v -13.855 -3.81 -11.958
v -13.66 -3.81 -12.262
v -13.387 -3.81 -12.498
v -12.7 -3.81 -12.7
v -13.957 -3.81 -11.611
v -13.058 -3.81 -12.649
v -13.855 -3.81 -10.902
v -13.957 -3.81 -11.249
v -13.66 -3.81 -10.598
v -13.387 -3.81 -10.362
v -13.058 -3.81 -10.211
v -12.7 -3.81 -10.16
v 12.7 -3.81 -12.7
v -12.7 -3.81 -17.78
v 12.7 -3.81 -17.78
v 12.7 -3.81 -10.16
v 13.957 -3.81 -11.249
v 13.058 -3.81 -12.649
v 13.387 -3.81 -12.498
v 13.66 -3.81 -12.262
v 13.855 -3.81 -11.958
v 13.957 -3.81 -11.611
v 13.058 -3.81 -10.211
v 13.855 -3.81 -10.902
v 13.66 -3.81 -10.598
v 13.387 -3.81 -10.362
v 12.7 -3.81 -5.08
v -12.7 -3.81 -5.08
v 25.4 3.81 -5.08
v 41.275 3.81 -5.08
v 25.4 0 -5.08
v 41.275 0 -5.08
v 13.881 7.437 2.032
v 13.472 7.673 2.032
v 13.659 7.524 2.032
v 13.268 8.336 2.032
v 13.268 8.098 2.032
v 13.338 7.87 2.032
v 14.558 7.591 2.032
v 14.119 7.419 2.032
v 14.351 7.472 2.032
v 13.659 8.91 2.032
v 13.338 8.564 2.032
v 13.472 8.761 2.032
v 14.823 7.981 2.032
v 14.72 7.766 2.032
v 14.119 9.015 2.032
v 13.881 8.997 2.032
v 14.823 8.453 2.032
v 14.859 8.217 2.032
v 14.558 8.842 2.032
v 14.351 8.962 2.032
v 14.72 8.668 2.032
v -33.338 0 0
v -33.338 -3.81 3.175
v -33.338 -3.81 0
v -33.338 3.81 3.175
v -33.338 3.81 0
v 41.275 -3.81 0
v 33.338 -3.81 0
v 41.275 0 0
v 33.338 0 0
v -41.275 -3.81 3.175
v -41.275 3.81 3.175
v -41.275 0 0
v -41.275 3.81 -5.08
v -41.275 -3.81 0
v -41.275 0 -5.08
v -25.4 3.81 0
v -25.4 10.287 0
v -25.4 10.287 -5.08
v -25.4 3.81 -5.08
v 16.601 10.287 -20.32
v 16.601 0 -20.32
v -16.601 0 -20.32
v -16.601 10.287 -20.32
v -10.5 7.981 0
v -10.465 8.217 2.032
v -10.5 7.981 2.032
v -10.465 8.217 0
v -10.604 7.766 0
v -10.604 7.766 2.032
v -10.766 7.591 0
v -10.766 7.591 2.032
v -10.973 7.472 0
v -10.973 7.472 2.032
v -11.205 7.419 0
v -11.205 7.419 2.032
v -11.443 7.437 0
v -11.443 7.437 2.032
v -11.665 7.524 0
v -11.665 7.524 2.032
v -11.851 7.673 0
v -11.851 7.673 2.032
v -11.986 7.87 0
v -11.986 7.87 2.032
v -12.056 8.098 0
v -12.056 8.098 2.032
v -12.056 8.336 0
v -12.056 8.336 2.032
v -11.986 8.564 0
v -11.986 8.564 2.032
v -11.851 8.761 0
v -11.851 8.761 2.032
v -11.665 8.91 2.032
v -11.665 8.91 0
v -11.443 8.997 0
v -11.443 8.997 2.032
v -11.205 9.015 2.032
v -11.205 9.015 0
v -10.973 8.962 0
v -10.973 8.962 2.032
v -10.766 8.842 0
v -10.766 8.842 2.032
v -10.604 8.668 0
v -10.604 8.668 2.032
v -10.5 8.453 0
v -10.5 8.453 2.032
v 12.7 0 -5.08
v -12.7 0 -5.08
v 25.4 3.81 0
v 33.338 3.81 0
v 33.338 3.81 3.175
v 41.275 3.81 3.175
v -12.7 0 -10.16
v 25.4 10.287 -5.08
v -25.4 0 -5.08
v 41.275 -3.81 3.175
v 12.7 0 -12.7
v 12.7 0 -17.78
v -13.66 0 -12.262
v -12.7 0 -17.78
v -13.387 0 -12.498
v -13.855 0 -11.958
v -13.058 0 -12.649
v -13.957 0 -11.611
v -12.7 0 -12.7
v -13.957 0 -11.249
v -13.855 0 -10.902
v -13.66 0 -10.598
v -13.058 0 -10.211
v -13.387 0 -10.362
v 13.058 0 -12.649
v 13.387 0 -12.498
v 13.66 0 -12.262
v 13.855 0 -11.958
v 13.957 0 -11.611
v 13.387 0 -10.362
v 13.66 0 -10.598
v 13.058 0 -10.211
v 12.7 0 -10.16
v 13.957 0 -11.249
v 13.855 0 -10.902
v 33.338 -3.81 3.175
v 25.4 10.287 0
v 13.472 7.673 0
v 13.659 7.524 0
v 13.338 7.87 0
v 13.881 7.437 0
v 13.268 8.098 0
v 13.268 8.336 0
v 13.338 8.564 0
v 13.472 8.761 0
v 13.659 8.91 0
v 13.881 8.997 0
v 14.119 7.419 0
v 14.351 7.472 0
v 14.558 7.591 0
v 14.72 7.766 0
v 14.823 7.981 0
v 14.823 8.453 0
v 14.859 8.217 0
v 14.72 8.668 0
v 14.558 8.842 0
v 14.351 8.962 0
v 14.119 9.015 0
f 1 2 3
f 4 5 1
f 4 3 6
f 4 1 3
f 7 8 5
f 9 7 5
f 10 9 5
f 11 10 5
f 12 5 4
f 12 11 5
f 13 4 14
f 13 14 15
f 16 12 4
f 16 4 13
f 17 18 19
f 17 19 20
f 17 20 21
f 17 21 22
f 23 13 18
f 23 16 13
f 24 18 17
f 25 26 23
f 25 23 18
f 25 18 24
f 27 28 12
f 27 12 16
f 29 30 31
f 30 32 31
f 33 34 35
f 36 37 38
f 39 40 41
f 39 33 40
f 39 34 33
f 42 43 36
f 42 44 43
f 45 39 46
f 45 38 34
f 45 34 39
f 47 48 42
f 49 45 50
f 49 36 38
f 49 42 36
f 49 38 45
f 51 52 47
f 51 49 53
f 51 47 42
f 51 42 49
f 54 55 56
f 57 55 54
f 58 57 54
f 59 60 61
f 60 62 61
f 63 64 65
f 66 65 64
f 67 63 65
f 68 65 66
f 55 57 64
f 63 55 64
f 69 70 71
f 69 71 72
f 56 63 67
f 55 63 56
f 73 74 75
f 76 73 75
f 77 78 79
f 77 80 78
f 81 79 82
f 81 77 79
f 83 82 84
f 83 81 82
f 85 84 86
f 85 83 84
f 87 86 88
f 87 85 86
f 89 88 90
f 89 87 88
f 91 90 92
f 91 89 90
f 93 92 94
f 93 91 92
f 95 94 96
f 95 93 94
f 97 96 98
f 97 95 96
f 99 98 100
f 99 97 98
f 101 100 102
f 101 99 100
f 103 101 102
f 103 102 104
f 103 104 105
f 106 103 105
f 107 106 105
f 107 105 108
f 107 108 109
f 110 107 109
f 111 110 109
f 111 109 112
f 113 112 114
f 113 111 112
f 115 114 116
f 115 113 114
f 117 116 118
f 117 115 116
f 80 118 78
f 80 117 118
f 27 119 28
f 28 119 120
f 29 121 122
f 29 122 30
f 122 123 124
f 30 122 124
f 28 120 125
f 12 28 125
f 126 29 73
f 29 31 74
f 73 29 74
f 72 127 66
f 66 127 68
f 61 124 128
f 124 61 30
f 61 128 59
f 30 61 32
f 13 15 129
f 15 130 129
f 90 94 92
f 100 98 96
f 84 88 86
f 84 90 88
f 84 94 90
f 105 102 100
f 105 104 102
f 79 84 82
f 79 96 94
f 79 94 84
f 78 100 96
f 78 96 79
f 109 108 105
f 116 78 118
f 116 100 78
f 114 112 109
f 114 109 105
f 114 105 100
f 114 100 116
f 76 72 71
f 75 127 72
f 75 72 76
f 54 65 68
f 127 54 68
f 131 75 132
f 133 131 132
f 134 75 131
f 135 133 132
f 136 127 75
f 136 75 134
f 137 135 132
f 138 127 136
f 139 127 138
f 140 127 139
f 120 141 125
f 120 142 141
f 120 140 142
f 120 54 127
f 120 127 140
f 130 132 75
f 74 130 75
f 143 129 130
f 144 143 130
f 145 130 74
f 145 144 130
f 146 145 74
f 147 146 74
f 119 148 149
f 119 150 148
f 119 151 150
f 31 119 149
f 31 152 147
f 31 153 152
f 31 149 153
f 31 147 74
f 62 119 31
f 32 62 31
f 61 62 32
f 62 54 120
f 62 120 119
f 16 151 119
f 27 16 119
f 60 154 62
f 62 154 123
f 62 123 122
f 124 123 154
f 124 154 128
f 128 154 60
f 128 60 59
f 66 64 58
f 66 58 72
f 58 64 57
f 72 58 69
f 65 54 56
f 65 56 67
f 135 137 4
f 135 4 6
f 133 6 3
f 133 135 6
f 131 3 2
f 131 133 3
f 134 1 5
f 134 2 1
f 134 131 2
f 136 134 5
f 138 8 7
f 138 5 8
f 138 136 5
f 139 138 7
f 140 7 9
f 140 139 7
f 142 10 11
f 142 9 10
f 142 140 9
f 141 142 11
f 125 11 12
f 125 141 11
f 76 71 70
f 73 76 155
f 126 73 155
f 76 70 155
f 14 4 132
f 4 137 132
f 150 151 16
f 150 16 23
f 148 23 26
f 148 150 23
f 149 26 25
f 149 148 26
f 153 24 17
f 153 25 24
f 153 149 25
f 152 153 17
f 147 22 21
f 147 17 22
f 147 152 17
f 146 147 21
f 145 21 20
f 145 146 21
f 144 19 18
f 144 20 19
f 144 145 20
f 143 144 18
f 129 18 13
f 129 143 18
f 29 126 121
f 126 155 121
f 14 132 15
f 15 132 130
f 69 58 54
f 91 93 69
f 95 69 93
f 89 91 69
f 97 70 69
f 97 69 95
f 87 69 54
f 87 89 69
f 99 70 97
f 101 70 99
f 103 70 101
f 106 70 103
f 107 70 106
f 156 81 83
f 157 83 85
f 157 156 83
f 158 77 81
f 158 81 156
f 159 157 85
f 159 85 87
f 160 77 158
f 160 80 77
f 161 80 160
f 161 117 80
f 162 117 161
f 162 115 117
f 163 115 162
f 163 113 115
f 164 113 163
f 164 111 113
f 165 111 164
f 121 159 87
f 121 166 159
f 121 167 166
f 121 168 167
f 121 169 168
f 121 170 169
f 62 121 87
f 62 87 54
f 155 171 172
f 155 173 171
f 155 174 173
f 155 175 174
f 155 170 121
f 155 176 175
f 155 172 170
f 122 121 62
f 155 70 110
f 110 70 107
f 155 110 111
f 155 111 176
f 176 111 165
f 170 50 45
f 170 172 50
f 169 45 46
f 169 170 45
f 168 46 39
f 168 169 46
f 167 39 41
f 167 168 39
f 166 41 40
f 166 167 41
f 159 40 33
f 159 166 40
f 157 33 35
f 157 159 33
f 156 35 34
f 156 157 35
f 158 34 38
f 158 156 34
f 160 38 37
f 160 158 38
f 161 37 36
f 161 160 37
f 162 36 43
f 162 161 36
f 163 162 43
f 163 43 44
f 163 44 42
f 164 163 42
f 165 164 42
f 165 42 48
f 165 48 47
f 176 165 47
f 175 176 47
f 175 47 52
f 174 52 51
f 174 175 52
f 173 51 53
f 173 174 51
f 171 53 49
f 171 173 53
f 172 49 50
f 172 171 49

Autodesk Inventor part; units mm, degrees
ref_plane "YZ Plane" through (0, 0, 0) normal (1, 0, 0) x (0, 1, 0)
ref_plane "XZ Plane" through (0, 0, 0) normal (0, 1, 0) x (-1, 0, 0)
ref_plane "XY Plane" through (0, 0, 0) normal (0, 0, 1) x (1, 0, 0)
sketch "Sketch1" plane through (0, 0, 0) normal (0, 0, 1) x (1, 0, 0)
  line L0 (0, 12.3444) -> (0, -2.0574) projected
  line L1 (-35.56, 0) -> (35.56, 0) projected
  line L2 (-35.56, 0) -> (35.56, 0) projected
  line L3 (0, -2.0574) -> (0, 12.3444) projected
  line L4 (-12.319, 8.2169) -> (15.113, 8.2169)
  line L5 (-10.2108, 8.2169) -> (13.0048, 8.2169)
  circle A0 centre (-11.2649, 8.2169) radius 1.0541
  circle A1 centre (14.0589, 8.2169) radius 1.0541
  line L6 (-25.4, 10.287) -> (-25.4, 0)
  line L7 (-25.4, 0) -> (25.4, 0)
  line L8 (-25.4, 10.287) -> (25.4, 10.287)
  line L9 (25.4, 10.287) -> (25.4, 0)
  line L10 (25.4, 10.287) -> (14.0589, 10.287)
  line L11 (14.0589, 10.287) -> (14.0589, 7.1628)
  line L12 (14.0589, 9.271) -> (14.0589, 10.287)
  line L13 (14.0589, 8.2169) -> (15.113, 8.2169)
  circle A2 centre (-11.2649, 8.2169) radius 0.8001
  circle A3 centre (14.0589, 8.2169) radius 0.8001
  point P0 (0, 0)
  dimension "d0" = 27.432
  dimension "d1" = 23.2156
  dimension "d2" = 2.1082
  dimension "d3" = 10.287
  dimension "d4" = 50.8
  dimension "d5" = 11.3411
  dimension "d6" = 1.016
  dimension "d7" = 11.3411
  dimension "d8" = 0.254
  dimension "d9" = 0.254
extrude "Extrusion1" add sketch "Sketch1" against normal blind 5.08 contours L8 L11 A1 L4 L0 | L0 L1 L6 L8 | L4 A1 L11 L8 L9 L1 L0
extrude "Extrusion2" add sketch "Sketch1" against normal blind 5.08 contours A0 L4 A2 | L4 A2 A0 | A1 L11 A3 L4 | L4 A3 L11 A1 | A1 L4 A3 L11 | A2 L4 | L4 A2 | A3 L11 L4 | L4 L11 A3 | L11 A3 L4 A1 | A3 L4 L11 | L4 A3 L11
extrude "Extrusion3" add sketch "Sketch1" along normal blind 2.032 contours A2 L4 | L4 A2 | A3 L11 L4 | L4 L11 A3 | A3 L4 L11 | L4 A3 L11
sketch "Sketch2" plane through (-25.4, 0, 0) normal (0, -1, 0) x (1, 0, 0)
  line L0 (50.8, 0) -> (50.8, -5.08) projected
  line L1 (0, 0) -> (50.8, 0) projected
  line L2 (0, 0) -> (0, -5.08) projected
  line L3 (38.1, -5.08) -> (12.7, -5.08)
  line L4 (12.7, -17.78) -> (38.1, -17.78)
  arc A0 (38.1, -12.7) -> (38.1, -10.16) centre (38.1, -11.43) ccw
  arc A1 (12.7, -10.16) -> (12.7, -12.7) centre (12.7, -11.43) ccw
  line L5 (38.1, -17.78) -> (38.1, -12.7)
  line L6 (38.1, -10.16) -> (38.1, -5.08)
  line L7 (12.7, -5.08) -> (12.7, -10.16)
  line L8 (12.7, -12.7) -> (12.7, -17.78)
  line L9 (50.8, 0) -> (0, 0)
  line L10 (25.4, 0) -> (25.4, -33.3128)
  line L11 (25.4, -5.08) -> (25.4, -17.78)
  line L12 (50.8, -5.08) -> (0, -5.08) projected
  line L13 (50.8, -5.08) -> (0, -5.08)
  line L14 (50.8, -5.08) -> (42.0012, -20.32)
  line L15 (50.8, -5.08) -> (70.0547, -5.08) construction
  line L16 (0, -5.08) -> (8.7988, -20.32)
  line L17 (0, -5.08) -> (24.702, -5.08) construction
  line L18 (42.0012, -20.32) -> (8.7988, -20.32)
  dimension "d16" = 25.4
  dimension "d17" = 12.7
  dimension "d18" = 2.54
  dimension "d19" = 2.54
  dimension "d20" = 5.08
  dimension "d21" = 5.08
  dimension "d23" = 6.35
  dimension "d24" = 6.35
  dimension "d26" = 120
  dimension "d27" = 60
  dimension "d29" = 12.7
  dimension "d30" = 33.2024
  dimension "d31" = 19.2547
  dimension "d32" = 28.2328
  dimension "d33" = 26.098
extrude "Extrusion4" add sketch "Sketch2" against normal blind 10.287 contours L14 L18 L10 L4 L5 A0 L6 L12 | L6 A0 L5 L4 L10 L3 | L10 L4 L8 A1 L7 L3 | L18 L16 L12 L7 A1 L8 L4 L10
extrude "Extrusion5" add sketch "Sketch2" along normal blind 3.81 contours L6 A0 L5 L4 L10 L3 | L10 L4 L8 A1 L7 L3
sketch "Sketch4" plane through (-25.4, 0, 0) normal (0, -1, 0) x (1, 0, 0)
  line L0 (38.1, -5.08) -> (12.7, -5.08)
  line L1 (0, 0) -> (50.8, 0)
  line L2 (0, 0) -> (0, -5.08)
  line L3 (50.8, 0) -> (50.8, -5.08)
  line L4 (-15.875, -5.08) -> (66.675, -5.08)
  line L5 (25.4, 0) -> (25.4, -41.8957)
  line L6 (-15.875, 0) -> (-15.875, -5.08)
  line L7 (0, 0) -> (0, -5.08)
  line L8 (0, 0) -> (-15.875, 0)
  line L9 (0, 0) -> (0, -5.08)
  line L10 (50.8, 0) -> (0, 0)
  line L11 (50.8, 0) -> (50.8, -5.08)
  line L12 (50.8, 0) -> (66.675, 0)
  line L13 (66.675, 0) -> (66.675, -5.08)
  line L14 (-15.875, 0) -> (-15.875, 3.175)
  line L15 (-7.9375, 3.175) -> (-15.875, 3.175)
  line L16 (-7.9375, 3.175) -> (-7.9375, 0)
  line L17 (-15.875, -5.08) -> (-15.875, 3.175)
  line L18 (-15.875, 3.175) -> (-7.9375, 3.175)
  line L19 (-7.9375, 3.175) -> (-7.9375, 0)
  line L20 (50.8, 0) -> (0, 0) projected
  line L21 (-15.875, 0) -> (0, 0)
  line L22 (0, 0) -> (0, -5.08) projected
  line L23 (0, 0) -> (0, -5.08)
  line L24 (0, -5.08) -> (0, 0)
  line L25 (-15.875, -5.08) -> (66.675, -5.08)
  line L26 (25.4, 0) -> (25.4, -5.08)
  line L27 (12.7, -5.08) -> (38.1, -5.08) projected
  line L28 (66.675, 0) -> (66.675, -5.08)
  line L29 (66.675, 0) -> (66.675, 3.175)
  line L30 (58.7375, 3.175) -> (66.675, 3.175)
  line L31 (58.7375, 3.175) -> (58.7375, 0)
  line L32 (50.8, 0) -> (50.8, -5.08)
  line L33 (50.8, 0) -> (50.8, -5.08)
  line L34 (50.8, 0) -> (66.675, 0)
  line L35 (50.8, 0) -> (50.8, -5.08)
  line L36 (50.8, 0) -> (0, 0)
  line L37 (0, 0) -> (50.8, 0)
  line L38 (66.675, -5.08) -> (-15.875, -5.08)
  line L39 (66.675, -5.08) -> (66.675, 3.175)
  line L40 (66.675, 3.175) -> (58.7375, 3.175)
  line L41 (58.7375, 3.175) -> (58.7375, 0)
  line L42 (0, 0) -> (50.8, 0)
  line L43 (66.675, 0) -> (50.8, 0)
  line L44 (50.8, 0) -> (50.8, -5.08)
  line L45 (50.8, 0) -> (50.8, -5.08)
  line L46 (50.8, -5.08) -> (50.8, 0)
  line L47 (66.675, -5.08) -> (-15.875, -5.08)
  line L48 (-15.875, 0) -> (-7.9375, 0)
  dimension "d40" = 82.55
  dimension "d41" = 3.175
extrude "Extrusion6" add sketch "Sketch4" against normal blind 3.81 contours L0 L5 L1 L3 L4 | L0 L4 L2 L1 L5 | L3 L12 L13 L4 | L4 L6 L8 L2
extrude "Extrusion7" add sketch "Sketch4" along normal mid plane 7.62 contours L31 L30 L29 L12 | L8 L14 L15 L16
properties part number "LED_Holder_V1"
